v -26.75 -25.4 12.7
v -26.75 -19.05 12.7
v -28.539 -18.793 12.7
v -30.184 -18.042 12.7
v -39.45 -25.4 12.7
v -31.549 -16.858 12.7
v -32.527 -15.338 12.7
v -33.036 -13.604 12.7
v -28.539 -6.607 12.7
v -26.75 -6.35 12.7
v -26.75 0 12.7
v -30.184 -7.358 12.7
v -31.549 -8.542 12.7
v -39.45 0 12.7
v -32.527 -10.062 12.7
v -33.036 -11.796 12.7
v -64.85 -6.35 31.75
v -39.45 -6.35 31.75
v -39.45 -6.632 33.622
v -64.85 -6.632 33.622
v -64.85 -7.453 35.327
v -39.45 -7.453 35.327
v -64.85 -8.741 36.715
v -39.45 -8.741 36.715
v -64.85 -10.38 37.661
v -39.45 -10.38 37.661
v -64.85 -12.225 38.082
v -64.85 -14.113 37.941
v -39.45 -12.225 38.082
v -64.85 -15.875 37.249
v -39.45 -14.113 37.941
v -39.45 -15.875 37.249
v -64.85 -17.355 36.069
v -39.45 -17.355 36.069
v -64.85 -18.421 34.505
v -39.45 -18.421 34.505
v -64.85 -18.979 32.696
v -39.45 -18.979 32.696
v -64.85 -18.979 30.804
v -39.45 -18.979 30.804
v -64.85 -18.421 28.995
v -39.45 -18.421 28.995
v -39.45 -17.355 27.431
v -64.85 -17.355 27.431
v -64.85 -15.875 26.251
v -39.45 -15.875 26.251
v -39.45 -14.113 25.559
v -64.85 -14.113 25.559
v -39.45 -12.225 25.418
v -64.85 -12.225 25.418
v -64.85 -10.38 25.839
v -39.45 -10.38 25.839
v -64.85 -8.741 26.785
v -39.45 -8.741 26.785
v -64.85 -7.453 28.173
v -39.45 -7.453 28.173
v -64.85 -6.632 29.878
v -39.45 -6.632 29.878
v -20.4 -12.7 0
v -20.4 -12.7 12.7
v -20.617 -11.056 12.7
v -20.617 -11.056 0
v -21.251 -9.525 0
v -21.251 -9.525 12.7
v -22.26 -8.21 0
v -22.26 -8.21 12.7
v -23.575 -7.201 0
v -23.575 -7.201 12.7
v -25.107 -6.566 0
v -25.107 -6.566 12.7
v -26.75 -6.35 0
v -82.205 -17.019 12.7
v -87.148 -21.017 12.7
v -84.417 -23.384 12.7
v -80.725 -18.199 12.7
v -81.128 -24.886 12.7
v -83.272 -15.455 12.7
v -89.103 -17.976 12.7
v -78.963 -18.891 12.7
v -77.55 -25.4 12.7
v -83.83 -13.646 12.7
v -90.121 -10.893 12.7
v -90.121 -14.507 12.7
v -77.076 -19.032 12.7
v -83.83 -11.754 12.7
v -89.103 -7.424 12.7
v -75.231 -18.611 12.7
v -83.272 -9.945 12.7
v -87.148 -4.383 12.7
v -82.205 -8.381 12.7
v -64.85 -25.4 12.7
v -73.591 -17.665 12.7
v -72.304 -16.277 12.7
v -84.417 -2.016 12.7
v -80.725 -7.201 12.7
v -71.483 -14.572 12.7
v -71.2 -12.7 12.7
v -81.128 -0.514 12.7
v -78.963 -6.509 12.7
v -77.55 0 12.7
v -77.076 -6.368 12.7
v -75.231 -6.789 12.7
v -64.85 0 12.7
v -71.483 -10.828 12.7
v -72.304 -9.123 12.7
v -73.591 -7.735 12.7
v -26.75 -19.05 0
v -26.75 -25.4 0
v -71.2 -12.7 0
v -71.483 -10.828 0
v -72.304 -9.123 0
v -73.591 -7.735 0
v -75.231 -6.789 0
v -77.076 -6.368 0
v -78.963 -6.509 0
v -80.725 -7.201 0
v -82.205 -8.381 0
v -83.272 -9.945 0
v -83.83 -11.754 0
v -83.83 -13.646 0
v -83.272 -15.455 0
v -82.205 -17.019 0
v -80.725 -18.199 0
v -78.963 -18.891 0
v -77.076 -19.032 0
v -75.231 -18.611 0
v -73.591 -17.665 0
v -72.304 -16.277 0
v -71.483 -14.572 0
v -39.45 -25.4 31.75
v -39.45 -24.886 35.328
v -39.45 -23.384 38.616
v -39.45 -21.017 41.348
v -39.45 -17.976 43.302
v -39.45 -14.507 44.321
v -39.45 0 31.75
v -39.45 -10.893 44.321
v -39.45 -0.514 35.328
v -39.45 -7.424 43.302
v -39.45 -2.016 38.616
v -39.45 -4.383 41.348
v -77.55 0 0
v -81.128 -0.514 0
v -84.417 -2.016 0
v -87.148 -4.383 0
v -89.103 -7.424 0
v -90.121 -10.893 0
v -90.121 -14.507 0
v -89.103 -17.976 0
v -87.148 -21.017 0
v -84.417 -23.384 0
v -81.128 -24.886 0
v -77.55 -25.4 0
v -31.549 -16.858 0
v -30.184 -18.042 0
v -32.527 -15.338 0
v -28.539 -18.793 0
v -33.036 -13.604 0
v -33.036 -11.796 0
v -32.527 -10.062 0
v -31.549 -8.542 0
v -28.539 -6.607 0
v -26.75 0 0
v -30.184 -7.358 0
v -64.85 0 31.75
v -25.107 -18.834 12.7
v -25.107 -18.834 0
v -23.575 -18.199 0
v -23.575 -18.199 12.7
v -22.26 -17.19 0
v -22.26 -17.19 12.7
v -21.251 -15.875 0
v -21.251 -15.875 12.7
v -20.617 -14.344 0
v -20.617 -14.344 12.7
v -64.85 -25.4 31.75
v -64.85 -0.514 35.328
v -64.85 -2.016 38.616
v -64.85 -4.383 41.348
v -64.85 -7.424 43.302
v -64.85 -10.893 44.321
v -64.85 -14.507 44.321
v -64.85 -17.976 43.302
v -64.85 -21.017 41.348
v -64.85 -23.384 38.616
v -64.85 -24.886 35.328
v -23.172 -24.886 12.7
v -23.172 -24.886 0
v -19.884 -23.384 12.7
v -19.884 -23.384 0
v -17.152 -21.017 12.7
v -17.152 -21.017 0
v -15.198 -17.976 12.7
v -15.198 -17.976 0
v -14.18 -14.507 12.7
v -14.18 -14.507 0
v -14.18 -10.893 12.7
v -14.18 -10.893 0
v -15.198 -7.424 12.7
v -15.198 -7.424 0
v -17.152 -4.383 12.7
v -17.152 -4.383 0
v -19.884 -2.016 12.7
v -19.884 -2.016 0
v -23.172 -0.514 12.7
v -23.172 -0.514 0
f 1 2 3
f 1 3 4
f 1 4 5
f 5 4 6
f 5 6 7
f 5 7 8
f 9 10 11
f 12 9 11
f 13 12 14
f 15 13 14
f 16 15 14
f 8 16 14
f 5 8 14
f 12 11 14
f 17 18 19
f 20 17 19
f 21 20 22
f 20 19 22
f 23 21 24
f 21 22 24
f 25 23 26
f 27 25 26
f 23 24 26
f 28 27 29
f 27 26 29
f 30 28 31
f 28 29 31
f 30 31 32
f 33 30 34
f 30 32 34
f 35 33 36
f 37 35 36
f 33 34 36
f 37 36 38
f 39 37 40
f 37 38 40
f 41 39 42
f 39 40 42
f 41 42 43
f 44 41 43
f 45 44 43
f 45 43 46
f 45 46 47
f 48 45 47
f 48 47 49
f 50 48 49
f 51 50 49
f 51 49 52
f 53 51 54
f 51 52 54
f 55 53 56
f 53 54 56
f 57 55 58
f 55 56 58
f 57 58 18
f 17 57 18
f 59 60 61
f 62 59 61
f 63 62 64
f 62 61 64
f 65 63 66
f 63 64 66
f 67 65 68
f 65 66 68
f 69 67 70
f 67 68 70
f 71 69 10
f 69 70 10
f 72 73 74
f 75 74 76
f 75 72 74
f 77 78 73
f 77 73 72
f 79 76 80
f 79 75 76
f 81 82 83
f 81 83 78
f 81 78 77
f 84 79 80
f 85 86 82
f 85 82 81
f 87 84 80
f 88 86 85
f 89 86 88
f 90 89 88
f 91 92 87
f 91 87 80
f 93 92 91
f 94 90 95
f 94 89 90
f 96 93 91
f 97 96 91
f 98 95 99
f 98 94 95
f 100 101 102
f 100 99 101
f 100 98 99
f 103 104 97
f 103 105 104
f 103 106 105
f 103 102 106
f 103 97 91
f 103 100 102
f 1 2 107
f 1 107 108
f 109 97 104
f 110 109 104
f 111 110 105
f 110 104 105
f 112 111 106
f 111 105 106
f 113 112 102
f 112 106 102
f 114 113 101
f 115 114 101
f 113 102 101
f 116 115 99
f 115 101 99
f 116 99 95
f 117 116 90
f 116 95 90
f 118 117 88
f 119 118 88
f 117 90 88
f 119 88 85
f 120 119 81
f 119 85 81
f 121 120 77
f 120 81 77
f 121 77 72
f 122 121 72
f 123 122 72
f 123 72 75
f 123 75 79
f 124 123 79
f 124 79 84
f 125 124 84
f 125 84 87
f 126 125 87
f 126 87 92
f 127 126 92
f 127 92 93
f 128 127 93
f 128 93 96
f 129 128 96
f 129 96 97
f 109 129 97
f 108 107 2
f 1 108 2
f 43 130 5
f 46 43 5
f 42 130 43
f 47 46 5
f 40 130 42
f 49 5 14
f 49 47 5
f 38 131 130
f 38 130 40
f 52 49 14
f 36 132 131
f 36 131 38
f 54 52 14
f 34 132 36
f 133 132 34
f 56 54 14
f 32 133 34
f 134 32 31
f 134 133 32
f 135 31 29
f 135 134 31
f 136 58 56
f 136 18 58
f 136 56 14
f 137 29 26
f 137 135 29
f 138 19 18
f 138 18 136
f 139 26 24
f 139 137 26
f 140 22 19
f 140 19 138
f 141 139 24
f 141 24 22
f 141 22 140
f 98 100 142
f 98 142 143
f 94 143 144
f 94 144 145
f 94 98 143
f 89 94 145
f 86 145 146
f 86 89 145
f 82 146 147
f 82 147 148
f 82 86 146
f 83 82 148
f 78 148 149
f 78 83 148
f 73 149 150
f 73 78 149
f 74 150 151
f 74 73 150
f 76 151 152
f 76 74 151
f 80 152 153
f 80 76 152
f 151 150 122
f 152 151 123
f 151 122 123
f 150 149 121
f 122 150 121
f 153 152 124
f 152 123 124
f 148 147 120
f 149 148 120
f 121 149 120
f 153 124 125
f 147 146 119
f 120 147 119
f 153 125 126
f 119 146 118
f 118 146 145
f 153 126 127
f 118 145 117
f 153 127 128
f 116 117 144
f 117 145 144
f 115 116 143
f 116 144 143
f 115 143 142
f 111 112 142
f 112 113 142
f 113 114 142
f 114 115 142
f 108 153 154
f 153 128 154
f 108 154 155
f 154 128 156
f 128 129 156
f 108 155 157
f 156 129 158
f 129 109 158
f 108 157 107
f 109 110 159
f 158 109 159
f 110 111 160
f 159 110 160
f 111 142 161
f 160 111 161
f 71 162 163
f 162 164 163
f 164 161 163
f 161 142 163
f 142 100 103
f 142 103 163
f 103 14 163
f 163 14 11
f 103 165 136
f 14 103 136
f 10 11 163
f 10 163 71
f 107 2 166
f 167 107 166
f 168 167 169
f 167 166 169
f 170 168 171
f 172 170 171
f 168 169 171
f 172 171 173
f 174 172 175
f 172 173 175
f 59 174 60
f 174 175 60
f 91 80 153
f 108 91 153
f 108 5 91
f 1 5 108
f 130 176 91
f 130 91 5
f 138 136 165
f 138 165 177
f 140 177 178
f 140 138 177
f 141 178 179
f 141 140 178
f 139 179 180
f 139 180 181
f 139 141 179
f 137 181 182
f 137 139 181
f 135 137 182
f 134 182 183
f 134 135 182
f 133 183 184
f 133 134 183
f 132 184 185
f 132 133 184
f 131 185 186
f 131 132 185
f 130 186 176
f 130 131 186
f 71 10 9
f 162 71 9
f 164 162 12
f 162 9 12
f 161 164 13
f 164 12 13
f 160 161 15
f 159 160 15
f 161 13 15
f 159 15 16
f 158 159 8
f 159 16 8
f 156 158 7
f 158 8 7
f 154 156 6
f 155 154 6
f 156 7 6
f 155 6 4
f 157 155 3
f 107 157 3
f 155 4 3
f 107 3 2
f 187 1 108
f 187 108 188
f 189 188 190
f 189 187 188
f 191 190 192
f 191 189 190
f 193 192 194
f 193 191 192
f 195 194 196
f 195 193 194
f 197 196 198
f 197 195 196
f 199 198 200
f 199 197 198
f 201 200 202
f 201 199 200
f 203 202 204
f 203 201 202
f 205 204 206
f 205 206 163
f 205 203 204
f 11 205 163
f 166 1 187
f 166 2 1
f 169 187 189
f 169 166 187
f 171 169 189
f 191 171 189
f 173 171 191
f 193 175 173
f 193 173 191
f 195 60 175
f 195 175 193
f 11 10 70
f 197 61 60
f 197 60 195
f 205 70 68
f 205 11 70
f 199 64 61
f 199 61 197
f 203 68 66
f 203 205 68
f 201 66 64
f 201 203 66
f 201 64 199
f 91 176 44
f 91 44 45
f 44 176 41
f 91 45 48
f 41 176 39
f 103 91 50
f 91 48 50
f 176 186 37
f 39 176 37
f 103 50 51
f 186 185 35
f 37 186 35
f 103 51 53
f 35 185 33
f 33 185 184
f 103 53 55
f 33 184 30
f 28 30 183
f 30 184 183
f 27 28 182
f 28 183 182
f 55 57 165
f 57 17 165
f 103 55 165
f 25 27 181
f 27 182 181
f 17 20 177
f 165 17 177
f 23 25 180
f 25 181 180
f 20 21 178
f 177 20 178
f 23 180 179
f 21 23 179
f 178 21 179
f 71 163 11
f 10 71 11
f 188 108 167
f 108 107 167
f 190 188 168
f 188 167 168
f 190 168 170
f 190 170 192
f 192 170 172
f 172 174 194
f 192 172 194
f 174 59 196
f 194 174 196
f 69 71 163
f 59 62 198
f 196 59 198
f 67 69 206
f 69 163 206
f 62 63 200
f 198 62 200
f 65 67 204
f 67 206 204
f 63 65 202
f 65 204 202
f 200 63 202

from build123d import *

# Parameters (mm, degrees)
F1_DEPTH  = 25.4
F3_DEPTH  = 12.7
F5_DEPTH  = 12.7
F7_DEPTH  = 25.4
F8_R      = 6.35
F9_DEPTH  = 25.4
F11_DEPTH = 25.4
F12_DEPTH = 25.4
F13_R     = 6.35
F14_DEPTH = 25.4


with BuildPart() as f1:
    # F0 (on Front) → F1 (new body)
    with BuildSketch(Plane.XZ):
        Polygon((-77.5504523965, 12.7), (-77.5504523965, 0), (-26.7504523965, 0), (-26.7504523965, 12.7), (-39.4504523965, 12.7), (-39.4504523965, 31.75), (-64.8504523965, 31.75), (-64.8504523965, 12.7), align=None)
    extrude(amount=F1_DEPTH)

    # F4 (on face) → F5 (join)
    with BuildSketch(Plane.XY.offset(12.7)):
        with BuildLine():
            Line((-77.5504523965, -25.4), (-77.5504523965, 0))
            ThreePointArc((-77.5504523965, 0), (-90.2504523965, -12.7), (-77.5504523965, -25.4))
        make_face()
    extrude(amount=-F5_DEPTH)

    # F6 (on face) → F7 (join)
    with BuildSketch(Plane.YZ.offset(-39.4504523965)):
        with BuildLine():
            Line((-25.4, 31.75), (0, 31.75))
            ThreePointArc((0, 31.75), (-12.7, 44.45), (-25.4, 31.75))
        make_face()
    extrude(amount=-F7_DEPTH)

    # F8 (on face) → F9 (cut)
    with BuildSketch(Plane.XY.offset(12.7)):
        with Locations((-77.5504523965, -12.7)):
            Circle(F8_R)
    extrude(amount=-F9_DEPTH, mode=Mode.SUBTRACT)


with BuildPart() as f3:
    # F2 (on face) → F3 (new body)
    with BuildSketch(Plane.XY.offset(12.7)):
        with BuildLine():
            Line((-26.7504523965, 0), (-26.7504523965, -25.4))
            ThreePointArc((-26.7504523965, -25.4), (-14.0504523965, -12.7), (-26.7504523965, 0))
        make_face()
    extrude(amount=-F3_DEPTH)


with BuildPart() as f11_tool:
    # F10 (on face) → F11 (new body)
    with BuildSketch(Plane.XY.offset(12.7)):
        with BuildLine():
            Line((-26.7504523965, -19.05), (-26.7504523965, -6.35))
            ThreePointArc((-26.7504523965, -6.35), (-33.1004523965, -12.7), (-26.7504523965, -19.05))
        make_face()
        with BuildLine():
            ThreePointArc((-26.7504523965, -19.05), (-22.2603243359, -17.1901280605), (-20.4004523965, -12.7))
            ThreePointArc((-20.4004523965, -12.7), (-22.2603243359, -8.2098719395), (-26.7504523965, -6.35))
            Line((-26.7504523965, -6.35), (-26.7504523965, -19.05))
        make_face()
    extrude(amount=-F11_DEPTH)


with BuildPart() as f1_1:
    add(f1.part)

    # F11: cut by f11_tool
    add(f11_tool.part, mode=Mode.SUBTRACT)

    # F10 (on face) → F12 (cut)
    with BuildSketch(Plane.XY.offset(12.7)):
        with BuildLine():
            ThreePointArc((-26.7504523965, -19.05), (-22.2603243359, -17.1901280605), (-20.4004523965, -12.7))
            ThreePointArc((-20.4004523965, -12.7), (-22.2603243359, -8.2098719395), (-26.7504523965, -6.35))
            Line((-26.7504523965, -6.35), (-26.7504523965, -19.05))
        make_face()
    extrude(amount=-F12_DEPTH, mode=Mode.SUBTRACT)

    # F13 (on face) → F14 (cut)
    with BuildSketch(Plane.YZ.offset(-39.4504523965)):
        with Locations((-12.7, 31.75)):
            Circle(F13_R)
    extrude(amount=-F14_DEPTH, mode=Mode.SUBTRACT)


with BuildPart() as f3_1:
    add(f3.part)

    # F11: cut by f11_tool
    add(f11_tool.part, mode=Mode.SUBTRACT)


solid = Compound([f1_1.part, f3_1.part])
